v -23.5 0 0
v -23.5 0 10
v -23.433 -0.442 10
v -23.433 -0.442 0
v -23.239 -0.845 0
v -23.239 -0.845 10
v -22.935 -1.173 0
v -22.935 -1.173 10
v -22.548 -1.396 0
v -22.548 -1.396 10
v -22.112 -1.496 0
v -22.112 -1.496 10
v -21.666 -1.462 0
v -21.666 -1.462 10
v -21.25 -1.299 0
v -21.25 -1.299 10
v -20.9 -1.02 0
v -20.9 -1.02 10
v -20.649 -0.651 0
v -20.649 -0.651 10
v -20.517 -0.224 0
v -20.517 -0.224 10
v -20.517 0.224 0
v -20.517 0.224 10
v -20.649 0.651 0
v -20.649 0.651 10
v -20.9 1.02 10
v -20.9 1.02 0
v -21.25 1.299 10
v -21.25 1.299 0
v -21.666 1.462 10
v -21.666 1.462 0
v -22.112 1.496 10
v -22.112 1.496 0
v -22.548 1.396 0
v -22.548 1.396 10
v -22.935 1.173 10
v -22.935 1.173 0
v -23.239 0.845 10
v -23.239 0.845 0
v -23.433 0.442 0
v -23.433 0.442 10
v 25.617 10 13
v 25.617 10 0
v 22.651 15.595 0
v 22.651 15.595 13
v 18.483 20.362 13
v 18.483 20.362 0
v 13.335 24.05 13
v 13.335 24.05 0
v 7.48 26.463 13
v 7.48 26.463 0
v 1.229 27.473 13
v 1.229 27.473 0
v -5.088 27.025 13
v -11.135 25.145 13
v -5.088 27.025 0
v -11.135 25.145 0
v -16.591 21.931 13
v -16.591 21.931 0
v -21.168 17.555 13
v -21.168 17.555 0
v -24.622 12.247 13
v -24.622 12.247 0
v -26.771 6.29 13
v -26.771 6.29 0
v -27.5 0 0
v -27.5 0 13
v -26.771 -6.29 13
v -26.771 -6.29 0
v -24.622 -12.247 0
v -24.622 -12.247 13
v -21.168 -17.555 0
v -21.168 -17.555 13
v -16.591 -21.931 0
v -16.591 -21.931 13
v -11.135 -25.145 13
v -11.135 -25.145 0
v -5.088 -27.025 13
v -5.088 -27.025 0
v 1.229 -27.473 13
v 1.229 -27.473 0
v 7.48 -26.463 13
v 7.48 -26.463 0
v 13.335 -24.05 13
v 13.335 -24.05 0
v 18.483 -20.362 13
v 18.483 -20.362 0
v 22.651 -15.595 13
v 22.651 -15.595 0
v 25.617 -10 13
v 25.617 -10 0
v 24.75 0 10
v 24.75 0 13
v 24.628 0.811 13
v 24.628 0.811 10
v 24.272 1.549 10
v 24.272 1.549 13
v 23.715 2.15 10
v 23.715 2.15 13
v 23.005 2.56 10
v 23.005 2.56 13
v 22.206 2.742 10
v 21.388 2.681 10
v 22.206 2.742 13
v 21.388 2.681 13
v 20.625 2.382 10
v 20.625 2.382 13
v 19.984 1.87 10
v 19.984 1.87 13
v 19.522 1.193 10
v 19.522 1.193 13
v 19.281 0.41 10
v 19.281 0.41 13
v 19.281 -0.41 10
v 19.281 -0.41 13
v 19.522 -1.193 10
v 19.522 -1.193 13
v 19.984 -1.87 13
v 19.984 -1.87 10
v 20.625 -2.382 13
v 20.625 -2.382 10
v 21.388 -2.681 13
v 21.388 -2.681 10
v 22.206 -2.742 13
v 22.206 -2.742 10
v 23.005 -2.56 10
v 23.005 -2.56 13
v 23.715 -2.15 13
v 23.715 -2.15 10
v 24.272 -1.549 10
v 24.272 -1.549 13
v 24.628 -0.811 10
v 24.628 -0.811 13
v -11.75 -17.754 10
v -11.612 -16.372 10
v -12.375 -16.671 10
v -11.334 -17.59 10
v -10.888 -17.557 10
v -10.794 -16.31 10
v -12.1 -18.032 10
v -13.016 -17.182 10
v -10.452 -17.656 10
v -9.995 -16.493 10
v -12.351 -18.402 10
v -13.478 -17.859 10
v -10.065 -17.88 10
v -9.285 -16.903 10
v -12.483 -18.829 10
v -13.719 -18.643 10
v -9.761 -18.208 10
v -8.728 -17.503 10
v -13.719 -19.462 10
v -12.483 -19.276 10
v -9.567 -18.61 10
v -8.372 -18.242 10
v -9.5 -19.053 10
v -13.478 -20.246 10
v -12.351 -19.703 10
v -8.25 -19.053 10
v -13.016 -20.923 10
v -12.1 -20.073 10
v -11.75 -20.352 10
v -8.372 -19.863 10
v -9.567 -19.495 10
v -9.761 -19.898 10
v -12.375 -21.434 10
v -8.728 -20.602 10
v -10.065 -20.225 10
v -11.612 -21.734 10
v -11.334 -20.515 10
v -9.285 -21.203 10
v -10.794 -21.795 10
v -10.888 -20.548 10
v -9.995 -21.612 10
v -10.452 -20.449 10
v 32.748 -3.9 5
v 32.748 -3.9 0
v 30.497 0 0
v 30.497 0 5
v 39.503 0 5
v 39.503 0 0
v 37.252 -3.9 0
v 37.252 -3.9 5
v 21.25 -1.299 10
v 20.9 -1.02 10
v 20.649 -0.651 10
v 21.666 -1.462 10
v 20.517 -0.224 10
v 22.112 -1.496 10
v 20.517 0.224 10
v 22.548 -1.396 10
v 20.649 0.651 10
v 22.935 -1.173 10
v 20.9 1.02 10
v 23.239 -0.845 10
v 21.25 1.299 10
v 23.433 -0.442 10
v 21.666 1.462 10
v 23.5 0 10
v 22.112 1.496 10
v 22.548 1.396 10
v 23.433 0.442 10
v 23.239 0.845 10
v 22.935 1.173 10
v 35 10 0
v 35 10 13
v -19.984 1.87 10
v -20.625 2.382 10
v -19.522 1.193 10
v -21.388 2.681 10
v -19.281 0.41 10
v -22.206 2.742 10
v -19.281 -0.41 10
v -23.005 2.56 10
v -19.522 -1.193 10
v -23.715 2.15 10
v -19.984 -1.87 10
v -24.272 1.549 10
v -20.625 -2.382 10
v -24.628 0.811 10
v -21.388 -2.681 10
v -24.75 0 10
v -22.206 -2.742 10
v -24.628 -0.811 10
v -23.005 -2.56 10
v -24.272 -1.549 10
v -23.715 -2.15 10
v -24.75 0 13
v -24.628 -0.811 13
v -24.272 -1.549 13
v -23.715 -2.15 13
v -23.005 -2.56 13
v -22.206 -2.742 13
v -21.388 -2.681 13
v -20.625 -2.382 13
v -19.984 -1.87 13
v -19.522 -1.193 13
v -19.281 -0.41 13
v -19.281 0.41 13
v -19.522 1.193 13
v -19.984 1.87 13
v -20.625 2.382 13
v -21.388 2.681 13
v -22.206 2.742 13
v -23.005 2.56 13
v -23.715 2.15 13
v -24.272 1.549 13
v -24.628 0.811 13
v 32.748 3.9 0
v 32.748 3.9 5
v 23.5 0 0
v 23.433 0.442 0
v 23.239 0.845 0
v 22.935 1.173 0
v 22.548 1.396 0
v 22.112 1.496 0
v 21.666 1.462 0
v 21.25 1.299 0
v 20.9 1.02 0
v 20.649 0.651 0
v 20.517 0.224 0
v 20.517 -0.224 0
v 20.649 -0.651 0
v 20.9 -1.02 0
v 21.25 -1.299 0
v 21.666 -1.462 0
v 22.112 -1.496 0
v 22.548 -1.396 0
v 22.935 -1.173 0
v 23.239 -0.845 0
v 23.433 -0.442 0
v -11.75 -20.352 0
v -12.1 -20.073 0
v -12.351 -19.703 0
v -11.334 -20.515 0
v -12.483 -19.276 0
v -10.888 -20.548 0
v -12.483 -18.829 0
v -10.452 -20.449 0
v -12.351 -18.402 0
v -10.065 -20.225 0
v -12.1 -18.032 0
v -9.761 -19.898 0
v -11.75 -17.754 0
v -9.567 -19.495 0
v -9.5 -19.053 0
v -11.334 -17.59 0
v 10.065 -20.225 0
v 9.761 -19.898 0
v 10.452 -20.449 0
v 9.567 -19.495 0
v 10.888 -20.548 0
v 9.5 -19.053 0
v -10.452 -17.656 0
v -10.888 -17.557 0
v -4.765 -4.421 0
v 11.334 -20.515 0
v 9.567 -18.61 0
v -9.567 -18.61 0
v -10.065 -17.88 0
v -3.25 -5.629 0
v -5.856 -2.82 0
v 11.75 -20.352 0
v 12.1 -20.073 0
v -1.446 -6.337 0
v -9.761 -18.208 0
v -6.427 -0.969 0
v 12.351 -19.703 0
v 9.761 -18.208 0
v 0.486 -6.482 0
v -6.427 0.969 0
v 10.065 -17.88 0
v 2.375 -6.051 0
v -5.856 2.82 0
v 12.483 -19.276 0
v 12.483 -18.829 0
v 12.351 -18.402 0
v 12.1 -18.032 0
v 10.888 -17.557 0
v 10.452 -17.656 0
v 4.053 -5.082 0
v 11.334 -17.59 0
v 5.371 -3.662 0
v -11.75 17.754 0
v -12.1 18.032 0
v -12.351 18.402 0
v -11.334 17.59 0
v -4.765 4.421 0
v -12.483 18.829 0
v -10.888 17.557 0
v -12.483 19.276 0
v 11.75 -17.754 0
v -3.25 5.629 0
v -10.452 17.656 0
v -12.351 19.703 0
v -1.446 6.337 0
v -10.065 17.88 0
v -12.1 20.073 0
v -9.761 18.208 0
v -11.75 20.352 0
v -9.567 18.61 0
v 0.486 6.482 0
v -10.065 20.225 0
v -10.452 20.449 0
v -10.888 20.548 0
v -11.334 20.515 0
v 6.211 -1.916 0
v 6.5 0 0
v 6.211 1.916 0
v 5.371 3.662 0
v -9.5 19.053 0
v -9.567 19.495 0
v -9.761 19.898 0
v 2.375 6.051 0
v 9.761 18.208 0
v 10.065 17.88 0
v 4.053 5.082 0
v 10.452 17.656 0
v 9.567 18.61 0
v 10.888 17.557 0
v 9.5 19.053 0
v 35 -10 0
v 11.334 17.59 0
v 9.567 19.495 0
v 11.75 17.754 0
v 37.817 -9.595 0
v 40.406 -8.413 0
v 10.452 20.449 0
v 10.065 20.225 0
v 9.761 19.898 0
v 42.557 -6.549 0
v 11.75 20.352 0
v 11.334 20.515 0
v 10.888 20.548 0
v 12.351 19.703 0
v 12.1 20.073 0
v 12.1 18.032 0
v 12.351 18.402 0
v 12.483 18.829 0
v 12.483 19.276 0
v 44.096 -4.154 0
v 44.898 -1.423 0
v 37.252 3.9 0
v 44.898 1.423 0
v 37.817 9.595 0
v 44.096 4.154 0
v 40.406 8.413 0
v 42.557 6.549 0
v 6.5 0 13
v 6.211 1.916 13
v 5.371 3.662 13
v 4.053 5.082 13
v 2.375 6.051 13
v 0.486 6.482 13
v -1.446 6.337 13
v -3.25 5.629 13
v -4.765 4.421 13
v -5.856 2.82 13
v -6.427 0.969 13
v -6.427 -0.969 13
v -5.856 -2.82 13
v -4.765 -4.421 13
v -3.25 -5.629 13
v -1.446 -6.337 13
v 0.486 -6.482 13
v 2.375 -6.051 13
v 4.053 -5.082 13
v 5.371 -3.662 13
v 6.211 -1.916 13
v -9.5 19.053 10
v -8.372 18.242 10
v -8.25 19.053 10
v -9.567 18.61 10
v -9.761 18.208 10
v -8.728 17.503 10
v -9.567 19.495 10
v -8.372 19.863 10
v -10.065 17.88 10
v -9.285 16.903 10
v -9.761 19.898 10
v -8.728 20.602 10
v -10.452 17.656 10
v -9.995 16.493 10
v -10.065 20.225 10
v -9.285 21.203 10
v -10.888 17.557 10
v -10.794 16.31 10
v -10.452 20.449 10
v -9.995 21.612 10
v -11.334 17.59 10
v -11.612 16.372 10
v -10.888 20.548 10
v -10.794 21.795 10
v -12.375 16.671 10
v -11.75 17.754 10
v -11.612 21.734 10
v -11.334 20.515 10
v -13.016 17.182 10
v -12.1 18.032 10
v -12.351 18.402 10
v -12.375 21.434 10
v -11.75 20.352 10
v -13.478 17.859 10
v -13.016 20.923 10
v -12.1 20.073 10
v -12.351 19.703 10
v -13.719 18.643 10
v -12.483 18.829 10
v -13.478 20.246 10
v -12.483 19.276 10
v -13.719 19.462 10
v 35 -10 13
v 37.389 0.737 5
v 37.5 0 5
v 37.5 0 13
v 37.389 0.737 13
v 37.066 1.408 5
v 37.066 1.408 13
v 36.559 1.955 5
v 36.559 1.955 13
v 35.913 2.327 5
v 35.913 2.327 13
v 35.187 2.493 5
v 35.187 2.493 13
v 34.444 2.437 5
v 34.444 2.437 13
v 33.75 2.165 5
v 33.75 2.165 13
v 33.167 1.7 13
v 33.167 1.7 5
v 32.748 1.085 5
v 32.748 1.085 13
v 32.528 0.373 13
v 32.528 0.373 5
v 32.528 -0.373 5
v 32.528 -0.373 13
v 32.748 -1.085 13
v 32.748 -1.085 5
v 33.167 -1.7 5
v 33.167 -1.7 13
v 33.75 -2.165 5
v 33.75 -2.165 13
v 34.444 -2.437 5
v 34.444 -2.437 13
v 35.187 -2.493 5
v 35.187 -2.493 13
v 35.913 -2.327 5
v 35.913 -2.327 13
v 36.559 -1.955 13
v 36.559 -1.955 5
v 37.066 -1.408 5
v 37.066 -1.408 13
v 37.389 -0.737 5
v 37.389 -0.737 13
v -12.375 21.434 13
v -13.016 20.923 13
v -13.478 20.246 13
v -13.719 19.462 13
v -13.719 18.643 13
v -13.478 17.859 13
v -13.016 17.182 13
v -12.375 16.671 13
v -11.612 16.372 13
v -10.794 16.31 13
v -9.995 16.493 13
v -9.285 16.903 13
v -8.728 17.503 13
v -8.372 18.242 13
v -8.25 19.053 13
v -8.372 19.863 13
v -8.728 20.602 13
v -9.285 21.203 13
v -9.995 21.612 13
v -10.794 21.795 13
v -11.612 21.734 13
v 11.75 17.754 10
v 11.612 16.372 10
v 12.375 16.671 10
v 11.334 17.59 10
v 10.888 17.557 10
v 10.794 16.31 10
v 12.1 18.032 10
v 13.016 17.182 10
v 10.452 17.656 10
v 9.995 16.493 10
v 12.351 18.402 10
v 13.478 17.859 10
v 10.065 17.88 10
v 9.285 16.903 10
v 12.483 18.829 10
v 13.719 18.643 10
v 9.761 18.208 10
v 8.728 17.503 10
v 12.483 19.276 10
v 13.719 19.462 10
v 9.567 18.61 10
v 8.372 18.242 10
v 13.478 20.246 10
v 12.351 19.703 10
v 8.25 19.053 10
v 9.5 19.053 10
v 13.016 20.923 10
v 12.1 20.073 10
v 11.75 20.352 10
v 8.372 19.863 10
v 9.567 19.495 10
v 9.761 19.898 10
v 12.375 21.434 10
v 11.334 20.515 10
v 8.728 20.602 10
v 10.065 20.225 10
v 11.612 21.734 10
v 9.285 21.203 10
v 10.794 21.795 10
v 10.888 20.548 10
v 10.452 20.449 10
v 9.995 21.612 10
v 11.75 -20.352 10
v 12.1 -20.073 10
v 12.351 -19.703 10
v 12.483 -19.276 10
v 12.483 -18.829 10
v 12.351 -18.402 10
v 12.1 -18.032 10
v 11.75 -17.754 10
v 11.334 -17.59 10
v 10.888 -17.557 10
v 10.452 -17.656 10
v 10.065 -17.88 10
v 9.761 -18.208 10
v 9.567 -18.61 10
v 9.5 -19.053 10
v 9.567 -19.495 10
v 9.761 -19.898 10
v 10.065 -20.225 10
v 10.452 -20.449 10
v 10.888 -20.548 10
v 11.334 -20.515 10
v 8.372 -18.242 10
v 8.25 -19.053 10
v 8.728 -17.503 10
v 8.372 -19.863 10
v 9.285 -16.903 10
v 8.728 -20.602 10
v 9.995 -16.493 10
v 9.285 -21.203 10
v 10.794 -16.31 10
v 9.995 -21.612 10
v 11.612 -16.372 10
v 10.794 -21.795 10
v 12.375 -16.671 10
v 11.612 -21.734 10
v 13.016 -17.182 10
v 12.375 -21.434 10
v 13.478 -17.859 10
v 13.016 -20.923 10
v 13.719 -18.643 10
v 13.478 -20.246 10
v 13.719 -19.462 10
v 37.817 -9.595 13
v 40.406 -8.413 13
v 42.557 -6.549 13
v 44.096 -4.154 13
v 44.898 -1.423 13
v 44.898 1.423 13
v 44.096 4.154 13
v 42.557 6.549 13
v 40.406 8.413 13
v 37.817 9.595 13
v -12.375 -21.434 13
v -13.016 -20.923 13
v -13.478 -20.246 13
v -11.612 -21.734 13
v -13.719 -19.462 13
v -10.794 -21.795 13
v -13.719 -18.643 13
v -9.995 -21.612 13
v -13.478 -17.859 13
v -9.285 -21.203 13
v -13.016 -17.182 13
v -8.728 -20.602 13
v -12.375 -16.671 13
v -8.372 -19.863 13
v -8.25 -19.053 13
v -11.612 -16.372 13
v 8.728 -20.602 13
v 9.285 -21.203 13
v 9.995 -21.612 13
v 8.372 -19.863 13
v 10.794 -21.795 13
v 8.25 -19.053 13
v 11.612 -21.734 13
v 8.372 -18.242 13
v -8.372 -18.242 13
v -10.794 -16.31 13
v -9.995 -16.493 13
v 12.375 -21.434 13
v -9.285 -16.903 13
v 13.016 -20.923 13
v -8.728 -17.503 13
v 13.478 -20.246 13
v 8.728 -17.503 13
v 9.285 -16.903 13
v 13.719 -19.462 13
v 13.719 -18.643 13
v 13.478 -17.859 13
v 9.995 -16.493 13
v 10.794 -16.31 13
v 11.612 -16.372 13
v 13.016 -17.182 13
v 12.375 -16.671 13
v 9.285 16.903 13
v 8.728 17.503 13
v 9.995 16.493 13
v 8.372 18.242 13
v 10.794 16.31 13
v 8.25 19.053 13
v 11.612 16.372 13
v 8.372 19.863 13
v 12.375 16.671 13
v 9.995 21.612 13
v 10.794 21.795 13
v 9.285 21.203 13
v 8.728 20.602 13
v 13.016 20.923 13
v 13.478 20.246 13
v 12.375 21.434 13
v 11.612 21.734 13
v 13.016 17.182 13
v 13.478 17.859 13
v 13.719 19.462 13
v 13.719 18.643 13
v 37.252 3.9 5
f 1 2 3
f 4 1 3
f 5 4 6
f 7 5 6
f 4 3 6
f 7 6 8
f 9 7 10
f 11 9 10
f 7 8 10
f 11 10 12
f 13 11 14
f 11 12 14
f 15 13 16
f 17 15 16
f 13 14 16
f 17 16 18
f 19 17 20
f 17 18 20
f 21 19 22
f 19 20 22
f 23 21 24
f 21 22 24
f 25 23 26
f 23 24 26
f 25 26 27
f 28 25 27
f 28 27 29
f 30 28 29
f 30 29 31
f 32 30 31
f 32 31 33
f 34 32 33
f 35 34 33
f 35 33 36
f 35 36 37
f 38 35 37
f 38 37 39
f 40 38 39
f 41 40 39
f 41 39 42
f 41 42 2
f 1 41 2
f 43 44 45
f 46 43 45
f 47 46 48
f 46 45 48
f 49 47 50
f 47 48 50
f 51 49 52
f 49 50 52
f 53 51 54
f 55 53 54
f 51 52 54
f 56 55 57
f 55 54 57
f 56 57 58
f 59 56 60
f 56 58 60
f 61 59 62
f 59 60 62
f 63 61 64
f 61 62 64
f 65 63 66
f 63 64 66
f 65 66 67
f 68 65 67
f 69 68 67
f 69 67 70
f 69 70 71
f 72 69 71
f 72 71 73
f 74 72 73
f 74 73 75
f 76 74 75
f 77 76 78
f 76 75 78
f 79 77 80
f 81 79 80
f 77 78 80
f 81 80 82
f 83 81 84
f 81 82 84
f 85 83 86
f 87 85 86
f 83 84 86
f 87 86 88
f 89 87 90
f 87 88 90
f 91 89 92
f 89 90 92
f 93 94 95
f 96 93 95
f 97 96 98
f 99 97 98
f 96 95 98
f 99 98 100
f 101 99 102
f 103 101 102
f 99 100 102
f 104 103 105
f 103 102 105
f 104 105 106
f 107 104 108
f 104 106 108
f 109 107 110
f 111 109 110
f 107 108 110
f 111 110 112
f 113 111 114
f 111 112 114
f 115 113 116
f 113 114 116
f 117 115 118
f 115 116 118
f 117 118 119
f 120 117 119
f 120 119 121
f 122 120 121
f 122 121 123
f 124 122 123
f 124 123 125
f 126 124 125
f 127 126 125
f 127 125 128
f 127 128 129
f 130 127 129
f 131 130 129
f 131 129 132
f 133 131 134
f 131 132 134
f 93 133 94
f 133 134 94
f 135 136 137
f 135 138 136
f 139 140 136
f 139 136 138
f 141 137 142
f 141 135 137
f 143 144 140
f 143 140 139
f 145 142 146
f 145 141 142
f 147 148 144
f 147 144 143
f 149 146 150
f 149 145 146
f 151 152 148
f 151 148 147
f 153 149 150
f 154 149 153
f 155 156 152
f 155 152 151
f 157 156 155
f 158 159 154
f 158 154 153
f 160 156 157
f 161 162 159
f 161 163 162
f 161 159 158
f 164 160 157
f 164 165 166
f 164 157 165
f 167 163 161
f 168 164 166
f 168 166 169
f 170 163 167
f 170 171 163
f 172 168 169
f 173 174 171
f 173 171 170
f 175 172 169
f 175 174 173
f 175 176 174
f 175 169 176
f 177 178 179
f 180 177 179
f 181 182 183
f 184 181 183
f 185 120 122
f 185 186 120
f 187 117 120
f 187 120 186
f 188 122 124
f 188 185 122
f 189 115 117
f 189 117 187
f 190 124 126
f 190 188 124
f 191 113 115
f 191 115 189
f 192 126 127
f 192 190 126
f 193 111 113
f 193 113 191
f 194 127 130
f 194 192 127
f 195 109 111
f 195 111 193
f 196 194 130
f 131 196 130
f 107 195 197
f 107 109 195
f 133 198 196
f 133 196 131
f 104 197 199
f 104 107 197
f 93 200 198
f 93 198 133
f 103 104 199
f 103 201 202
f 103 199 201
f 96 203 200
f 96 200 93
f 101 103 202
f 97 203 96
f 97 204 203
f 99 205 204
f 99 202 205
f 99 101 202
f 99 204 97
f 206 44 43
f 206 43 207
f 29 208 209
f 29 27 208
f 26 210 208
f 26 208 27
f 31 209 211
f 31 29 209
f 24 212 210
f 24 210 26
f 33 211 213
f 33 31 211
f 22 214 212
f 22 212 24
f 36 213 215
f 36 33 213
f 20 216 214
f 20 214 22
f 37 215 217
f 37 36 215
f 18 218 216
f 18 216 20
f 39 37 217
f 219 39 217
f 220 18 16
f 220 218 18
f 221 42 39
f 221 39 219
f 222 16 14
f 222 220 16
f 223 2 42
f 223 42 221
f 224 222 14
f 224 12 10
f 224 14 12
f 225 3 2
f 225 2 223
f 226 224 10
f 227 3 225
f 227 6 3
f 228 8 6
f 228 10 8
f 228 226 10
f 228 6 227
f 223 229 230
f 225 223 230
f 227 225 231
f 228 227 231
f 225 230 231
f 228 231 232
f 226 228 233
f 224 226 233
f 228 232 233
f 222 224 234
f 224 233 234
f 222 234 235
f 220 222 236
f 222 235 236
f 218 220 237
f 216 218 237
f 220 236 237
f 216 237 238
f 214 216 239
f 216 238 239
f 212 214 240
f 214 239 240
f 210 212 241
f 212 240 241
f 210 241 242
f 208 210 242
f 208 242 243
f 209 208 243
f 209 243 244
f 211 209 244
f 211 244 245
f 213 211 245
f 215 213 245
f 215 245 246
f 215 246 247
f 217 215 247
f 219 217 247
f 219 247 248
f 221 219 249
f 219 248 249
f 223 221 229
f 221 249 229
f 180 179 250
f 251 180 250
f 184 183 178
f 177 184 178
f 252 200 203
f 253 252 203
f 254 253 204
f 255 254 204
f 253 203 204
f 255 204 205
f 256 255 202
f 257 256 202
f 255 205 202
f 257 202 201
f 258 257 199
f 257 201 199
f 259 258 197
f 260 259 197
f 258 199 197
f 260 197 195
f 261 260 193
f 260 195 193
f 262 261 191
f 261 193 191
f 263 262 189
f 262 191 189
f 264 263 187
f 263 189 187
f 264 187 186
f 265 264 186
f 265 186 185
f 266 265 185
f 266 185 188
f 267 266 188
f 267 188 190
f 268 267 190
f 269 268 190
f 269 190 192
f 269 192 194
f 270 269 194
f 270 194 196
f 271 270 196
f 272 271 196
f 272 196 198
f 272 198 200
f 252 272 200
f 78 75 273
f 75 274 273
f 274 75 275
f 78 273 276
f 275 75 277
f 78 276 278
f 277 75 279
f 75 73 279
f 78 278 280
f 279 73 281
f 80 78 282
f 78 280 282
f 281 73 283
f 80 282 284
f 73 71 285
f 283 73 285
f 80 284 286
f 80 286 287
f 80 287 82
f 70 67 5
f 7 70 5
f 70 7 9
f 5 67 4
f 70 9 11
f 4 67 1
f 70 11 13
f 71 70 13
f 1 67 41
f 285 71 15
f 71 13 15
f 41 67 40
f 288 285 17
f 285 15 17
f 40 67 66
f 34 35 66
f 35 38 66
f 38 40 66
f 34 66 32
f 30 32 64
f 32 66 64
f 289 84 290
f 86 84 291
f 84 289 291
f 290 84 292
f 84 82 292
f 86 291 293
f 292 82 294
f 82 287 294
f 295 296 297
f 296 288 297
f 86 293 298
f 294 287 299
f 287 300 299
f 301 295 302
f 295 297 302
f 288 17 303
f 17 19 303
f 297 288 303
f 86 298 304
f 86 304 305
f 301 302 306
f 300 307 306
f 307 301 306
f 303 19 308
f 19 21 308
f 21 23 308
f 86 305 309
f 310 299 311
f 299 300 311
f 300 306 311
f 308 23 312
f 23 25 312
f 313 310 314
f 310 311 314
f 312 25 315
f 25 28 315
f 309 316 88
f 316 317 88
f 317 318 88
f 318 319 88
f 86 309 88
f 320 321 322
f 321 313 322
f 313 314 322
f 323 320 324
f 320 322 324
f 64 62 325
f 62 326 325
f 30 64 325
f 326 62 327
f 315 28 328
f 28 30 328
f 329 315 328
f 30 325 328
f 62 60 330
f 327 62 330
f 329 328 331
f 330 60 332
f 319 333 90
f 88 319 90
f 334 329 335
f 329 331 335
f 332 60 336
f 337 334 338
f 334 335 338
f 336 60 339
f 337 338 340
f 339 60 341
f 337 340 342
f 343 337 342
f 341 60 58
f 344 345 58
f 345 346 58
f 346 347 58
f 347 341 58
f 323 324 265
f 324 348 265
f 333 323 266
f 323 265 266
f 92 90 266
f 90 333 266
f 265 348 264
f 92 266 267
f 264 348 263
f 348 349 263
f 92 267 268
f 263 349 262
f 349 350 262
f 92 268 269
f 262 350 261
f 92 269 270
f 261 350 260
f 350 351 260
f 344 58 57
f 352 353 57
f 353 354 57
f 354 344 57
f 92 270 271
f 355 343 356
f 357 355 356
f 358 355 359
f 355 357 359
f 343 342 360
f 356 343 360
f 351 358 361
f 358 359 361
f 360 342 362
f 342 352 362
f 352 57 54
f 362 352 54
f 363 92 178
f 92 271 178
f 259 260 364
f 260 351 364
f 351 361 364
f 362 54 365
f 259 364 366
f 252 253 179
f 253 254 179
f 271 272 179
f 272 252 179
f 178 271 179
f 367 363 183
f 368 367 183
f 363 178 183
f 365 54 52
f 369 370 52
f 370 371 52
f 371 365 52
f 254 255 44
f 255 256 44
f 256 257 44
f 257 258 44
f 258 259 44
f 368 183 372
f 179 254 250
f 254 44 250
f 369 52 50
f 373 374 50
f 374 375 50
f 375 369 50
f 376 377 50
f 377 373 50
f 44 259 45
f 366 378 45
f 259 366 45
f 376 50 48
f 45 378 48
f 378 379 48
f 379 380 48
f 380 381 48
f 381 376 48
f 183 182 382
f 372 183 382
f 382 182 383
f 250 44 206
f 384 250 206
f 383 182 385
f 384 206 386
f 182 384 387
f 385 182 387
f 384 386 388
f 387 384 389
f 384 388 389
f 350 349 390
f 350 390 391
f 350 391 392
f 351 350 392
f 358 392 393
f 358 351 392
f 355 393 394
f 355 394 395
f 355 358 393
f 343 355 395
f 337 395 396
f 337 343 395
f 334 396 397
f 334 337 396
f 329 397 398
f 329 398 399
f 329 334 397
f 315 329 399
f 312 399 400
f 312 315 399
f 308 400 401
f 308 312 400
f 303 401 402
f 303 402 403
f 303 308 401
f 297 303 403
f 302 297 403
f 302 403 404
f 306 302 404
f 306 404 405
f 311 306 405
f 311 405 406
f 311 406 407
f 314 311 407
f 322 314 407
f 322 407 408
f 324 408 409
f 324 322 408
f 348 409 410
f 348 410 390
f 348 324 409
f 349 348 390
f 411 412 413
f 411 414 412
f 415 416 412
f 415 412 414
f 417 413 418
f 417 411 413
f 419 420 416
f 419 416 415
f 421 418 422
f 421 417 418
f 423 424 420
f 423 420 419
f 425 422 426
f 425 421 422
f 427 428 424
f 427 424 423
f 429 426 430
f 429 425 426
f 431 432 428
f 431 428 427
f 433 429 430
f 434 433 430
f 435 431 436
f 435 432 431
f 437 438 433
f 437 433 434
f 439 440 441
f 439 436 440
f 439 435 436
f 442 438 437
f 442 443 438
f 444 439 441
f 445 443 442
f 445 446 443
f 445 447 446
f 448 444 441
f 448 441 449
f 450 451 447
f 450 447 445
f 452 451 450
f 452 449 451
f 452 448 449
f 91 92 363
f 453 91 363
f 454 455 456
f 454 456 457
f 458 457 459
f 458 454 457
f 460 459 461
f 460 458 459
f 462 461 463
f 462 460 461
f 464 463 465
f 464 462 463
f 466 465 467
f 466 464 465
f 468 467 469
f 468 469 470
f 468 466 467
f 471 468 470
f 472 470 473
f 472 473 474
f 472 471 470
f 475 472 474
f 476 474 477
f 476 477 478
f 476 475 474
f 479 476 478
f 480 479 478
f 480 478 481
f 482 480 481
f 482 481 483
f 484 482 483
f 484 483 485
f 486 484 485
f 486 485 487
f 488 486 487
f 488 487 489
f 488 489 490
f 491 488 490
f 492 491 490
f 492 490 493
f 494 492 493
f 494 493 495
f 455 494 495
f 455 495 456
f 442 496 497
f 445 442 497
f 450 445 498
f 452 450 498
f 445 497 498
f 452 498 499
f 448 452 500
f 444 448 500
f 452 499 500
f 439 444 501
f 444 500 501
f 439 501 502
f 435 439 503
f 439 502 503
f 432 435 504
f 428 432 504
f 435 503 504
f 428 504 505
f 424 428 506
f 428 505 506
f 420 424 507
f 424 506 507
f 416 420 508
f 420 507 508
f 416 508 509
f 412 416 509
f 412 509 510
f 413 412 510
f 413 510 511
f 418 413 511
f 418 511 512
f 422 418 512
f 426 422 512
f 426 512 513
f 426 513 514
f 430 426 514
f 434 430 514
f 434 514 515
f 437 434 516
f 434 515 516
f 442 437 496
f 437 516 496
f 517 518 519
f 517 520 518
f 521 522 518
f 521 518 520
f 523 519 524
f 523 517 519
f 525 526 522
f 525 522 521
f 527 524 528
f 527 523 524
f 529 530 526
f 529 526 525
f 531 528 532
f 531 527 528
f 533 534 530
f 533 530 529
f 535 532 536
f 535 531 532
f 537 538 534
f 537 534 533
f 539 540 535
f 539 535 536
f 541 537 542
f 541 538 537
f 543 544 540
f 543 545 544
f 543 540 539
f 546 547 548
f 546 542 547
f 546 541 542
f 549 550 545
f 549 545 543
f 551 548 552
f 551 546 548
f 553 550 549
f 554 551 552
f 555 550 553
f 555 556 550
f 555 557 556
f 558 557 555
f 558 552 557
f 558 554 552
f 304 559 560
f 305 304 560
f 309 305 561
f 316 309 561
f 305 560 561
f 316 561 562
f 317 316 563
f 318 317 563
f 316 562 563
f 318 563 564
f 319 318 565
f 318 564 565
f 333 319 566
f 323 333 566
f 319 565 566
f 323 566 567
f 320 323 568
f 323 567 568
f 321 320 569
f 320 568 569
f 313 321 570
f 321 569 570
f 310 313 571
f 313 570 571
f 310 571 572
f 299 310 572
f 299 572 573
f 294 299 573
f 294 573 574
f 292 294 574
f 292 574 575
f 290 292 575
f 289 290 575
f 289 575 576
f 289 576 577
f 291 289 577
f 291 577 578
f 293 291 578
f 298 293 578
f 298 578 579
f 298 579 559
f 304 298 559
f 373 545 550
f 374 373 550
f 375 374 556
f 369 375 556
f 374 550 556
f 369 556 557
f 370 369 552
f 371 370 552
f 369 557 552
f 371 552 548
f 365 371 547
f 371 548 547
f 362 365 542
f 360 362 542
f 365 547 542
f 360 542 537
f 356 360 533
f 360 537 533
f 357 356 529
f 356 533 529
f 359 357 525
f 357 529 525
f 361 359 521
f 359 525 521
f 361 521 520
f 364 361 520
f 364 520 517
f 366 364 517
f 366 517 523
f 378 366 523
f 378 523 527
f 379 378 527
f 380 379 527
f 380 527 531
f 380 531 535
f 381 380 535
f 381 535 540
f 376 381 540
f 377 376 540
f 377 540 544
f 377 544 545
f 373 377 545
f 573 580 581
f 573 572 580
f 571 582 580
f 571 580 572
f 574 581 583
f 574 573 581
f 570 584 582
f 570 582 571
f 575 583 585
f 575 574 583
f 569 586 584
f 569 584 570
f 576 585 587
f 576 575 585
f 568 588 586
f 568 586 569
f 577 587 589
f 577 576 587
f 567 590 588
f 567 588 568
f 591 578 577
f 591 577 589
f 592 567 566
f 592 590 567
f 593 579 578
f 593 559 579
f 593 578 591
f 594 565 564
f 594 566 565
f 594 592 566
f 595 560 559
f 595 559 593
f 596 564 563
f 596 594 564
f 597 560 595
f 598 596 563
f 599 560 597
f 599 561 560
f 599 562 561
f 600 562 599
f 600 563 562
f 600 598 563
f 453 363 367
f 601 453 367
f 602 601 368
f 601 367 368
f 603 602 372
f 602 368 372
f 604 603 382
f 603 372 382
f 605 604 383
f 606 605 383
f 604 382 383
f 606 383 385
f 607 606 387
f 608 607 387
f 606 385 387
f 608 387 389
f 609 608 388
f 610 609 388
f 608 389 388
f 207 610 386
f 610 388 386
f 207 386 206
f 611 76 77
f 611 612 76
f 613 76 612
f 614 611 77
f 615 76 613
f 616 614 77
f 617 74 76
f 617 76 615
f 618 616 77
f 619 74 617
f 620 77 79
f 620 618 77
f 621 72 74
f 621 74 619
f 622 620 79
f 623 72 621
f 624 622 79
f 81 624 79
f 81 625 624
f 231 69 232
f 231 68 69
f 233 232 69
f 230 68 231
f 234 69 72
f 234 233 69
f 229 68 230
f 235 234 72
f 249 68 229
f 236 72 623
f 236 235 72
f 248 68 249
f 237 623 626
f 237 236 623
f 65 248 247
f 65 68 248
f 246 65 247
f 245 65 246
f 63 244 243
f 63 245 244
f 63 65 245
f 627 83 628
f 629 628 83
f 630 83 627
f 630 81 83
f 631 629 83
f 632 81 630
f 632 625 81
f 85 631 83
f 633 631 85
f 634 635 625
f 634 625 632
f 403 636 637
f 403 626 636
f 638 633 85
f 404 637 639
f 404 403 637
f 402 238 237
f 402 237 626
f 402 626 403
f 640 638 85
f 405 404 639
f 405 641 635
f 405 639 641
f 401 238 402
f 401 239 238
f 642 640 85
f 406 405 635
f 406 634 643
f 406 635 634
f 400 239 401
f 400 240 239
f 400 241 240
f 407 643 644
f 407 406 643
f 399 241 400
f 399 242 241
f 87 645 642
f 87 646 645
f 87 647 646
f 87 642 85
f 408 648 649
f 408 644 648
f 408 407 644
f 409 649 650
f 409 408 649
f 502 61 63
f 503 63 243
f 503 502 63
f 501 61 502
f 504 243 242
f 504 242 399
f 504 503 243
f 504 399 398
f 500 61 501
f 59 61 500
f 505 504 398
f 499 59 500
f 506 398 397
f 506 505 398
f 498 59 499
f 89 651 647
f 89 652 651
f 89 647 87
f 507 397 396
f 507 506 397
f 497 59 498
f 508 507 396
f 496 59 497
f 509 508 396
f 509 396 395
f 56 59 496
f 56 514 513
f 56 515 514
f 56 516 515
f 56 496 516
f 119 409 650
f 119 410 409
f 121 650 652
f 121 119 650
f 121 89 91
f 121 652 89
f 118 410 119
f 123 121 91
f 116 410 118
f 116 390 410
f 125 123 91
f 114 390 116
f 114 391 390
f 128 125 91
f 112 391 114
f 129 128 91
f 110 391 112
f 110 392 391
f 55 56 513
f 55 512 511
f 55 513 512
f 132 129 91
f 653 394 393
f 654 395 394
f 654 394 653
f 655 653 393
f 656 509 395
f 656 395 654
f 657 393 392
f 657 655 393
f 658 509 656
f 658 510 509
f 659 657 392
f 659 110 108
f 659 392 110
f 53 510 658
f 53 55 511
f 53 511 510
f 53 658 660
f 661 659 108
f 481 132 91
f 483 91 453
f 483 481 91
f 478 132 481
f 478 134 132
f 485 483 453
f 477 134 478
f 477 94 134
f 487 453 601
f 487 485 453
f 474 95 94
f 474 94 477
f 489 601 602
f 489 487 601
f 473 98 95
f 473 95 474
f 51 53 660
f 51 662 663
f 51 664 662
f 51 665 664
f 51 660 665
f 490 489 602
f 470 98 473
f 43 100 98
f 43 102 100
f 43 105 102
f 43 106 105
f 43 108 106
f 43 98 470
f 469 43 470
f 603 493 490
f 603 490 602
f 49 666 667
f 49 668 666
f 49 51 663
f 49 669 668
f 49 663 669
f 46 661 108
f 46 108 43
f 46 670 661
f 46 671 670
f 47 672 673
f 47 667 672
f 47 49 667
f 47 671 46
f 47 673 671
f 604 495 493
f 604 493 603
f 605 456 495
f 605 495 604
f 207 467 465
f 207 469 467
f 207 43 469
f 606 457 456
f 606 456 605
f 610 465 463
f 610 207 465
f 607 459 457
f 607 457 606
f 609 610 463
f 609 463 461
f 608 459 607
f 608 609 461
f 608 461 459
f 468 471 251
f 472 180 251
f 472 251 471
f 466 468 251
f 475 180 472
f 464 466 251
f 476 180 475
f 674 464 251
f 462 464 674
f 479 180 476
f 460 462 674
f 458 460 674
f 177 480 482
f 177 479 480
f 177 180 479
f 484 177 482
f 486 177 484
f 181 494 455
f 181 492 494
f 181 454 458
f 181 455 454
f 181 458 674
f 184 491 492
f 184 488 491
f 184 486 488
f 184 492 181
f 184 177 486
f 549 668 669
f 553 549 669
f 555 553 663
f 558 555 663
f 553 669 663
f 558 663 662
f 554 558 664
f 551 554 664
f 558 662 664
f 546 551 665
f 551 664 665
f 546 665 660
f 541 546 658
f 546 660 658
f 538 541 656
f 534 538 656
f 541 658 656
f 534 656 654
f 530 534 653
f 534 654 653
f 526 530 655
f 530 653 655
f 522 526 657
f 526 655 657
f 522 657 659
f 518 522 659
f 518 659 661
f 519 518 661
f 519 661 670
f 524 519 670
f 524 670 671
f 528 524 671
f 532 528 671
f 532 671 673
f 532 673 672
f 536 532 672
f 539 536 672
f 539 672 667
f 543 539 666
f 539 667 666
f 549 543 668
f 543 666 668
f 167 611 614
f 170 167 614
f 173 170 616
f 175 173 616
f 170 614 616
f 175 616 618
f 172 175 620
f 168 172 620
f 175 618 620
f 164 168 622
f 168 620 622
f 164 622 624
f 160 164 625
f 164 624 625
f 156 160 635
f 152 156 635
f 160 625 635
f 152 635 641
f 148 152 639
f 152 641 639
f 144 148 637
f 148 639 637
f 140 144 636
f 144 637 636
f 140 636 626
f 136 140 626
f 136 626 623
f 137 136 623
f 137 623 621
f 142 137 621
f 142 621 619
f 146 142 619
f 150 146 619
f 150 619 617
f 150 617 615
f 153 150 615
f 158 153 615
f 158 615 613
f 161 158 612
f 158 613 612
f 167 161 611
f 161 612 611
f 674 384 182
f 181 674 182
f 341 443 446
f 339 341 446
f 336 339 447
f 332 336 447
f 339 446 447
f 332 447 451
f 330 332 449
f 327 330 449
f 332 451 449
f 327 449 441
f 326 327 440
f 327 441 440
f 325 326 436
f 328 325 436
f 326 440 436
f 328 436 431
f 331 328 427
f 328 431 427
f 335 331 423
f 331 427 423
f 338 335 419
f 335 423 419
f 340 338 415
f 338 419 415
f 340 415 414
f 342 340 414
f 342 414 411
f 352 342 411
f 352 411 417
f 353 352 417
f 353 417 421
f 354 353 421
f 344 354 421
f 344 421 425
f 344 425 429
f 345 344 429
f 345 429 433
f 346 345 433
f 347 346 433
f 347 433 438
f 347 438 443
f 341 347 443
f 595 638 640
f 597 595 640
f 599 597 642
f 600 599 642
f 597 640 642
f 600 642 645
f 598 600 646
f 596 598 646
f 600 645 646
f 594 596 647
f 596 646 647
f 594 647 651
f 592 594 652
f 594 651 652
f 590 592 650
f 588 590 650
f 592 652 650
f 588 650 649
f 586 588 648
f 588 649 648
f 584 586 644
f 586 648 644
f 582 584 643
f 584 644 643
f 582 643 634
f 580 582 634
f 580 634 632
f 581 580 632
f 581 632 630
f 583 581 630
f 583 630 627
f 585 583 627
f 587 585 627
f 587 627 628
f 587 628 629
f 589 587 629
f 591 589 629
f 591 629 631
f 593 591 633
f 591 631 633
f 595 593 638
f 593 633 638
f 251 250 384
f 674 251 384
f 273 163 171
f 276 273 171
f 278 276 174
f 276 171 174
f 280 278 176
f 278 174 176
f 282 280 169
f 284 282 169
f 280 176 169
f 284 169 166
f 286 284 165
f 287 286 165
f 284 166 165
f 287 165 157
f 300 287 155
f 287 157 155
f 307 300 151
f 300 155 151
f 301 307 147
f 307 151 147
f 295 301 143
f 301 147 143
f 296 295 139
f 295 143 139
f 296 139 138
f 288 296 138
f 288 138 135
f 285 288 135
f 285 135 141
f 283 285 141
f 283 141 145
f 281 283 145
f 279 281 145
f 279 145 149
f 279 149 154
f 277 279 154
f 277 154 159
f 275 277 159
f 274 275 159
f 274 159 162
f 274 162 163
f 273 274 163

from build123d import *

# Parameters (mm, degrees)
SKETCH_R              = 6.5
SKETCH_R_2            = 2.5
PAD_DEPTH             = 13
SKETCH001_R           = 1.5
POCKET_DEPTH          = 20
POLARPATTERN_COUNT    = 6
SKETCH002_R           = 2.75
POCKET001_DEPTH       = 3
POLARPATTERN001_COUNT = 6
POCKET002_DEPTH       = 5


with BuildPart() as part:
    # Sketch → Pad (new body)
    with BuildSketch(Plane.XY):
        with BuildLine():
            ThreePointArc((25.617377, 10), (-27.5, 0), (25.617377, -10))
            Line((25.617377, -10), (35, -10))
            ThreePointArc((35, -10), (45, 0), (35, 10))
            Line((25.617377, 10), (35, 10))
        make_face()
        Circle(SKETCH_R, mode=Mode.SUBTRACT)
        with Locations((35, 0)):
            Circle(SKETCH_R_2, mode=Mode.SUBTRACT)
    extrude(amount=PAD_DEPTH)

    # Sketch001 (on Face8 of Pad) → Pocket (cut)
    with BuildSketch(Plane.XY.offset(13)):
        with Locations((22, 0)):
            Circle(SKETCH001_R)
    pocket = extrude(amount=-POCKET_DEPTH, mode=Mode.SUBTRACT)

    # PolarPattern: Pocket ×6 about axis
    polarpattern_axis = Axis((0, 0, 13), (0, 0, 1))
    for i in range(1, POLARPATTERN_COUNT):
        add(pocket.rotate(polarpattern_axis, i * 360 / POLARPATTERN_COUNT), mode=Mode.SUBTRACT)

    # Sketch002 (on Face5 of PolarPattern) → Pocket001 (cut)
    with BuildSketch(Plane.XY.offset(13)):
        with Locations((22, 0)):
            Circle(SKETCH002_R)
    pocket001 = extrude(amount=-POCKET001_DEPTH, mode=Mode.SUBTRACT)

    # PolarPattern001: Pocket001 ×6 about axis
    polarpattern001_axis = Axis((0, 0, 13), (0, 0, 1))
    for i in range(1, POLARPATTERN001_COUNT):
        add(pocket001.rotate(polarpattern001_axis, i * 360 / POLARPATTERN001_COUNT), mode=Mode.SUBTRACT)

    # Sketch003 (on Face4 of PolarPattern001) → Pocket002 (cut)
    with BuildSketch(Plane(origin=(0, 0, 0), x_dir=(1, 0, 0), z_dir=(0, 0, -1))):
        Polygon((39.503332, 0), (37.251666, 3.9), (32.748334, 3.9), (30.496668, 0), (32.748334, -3.9), (37.251666, -3.9), align=None)
    extrude(amount=-POCKET002_DEPTH, mode=Mode.SUBTRACT)


solid = part.part
